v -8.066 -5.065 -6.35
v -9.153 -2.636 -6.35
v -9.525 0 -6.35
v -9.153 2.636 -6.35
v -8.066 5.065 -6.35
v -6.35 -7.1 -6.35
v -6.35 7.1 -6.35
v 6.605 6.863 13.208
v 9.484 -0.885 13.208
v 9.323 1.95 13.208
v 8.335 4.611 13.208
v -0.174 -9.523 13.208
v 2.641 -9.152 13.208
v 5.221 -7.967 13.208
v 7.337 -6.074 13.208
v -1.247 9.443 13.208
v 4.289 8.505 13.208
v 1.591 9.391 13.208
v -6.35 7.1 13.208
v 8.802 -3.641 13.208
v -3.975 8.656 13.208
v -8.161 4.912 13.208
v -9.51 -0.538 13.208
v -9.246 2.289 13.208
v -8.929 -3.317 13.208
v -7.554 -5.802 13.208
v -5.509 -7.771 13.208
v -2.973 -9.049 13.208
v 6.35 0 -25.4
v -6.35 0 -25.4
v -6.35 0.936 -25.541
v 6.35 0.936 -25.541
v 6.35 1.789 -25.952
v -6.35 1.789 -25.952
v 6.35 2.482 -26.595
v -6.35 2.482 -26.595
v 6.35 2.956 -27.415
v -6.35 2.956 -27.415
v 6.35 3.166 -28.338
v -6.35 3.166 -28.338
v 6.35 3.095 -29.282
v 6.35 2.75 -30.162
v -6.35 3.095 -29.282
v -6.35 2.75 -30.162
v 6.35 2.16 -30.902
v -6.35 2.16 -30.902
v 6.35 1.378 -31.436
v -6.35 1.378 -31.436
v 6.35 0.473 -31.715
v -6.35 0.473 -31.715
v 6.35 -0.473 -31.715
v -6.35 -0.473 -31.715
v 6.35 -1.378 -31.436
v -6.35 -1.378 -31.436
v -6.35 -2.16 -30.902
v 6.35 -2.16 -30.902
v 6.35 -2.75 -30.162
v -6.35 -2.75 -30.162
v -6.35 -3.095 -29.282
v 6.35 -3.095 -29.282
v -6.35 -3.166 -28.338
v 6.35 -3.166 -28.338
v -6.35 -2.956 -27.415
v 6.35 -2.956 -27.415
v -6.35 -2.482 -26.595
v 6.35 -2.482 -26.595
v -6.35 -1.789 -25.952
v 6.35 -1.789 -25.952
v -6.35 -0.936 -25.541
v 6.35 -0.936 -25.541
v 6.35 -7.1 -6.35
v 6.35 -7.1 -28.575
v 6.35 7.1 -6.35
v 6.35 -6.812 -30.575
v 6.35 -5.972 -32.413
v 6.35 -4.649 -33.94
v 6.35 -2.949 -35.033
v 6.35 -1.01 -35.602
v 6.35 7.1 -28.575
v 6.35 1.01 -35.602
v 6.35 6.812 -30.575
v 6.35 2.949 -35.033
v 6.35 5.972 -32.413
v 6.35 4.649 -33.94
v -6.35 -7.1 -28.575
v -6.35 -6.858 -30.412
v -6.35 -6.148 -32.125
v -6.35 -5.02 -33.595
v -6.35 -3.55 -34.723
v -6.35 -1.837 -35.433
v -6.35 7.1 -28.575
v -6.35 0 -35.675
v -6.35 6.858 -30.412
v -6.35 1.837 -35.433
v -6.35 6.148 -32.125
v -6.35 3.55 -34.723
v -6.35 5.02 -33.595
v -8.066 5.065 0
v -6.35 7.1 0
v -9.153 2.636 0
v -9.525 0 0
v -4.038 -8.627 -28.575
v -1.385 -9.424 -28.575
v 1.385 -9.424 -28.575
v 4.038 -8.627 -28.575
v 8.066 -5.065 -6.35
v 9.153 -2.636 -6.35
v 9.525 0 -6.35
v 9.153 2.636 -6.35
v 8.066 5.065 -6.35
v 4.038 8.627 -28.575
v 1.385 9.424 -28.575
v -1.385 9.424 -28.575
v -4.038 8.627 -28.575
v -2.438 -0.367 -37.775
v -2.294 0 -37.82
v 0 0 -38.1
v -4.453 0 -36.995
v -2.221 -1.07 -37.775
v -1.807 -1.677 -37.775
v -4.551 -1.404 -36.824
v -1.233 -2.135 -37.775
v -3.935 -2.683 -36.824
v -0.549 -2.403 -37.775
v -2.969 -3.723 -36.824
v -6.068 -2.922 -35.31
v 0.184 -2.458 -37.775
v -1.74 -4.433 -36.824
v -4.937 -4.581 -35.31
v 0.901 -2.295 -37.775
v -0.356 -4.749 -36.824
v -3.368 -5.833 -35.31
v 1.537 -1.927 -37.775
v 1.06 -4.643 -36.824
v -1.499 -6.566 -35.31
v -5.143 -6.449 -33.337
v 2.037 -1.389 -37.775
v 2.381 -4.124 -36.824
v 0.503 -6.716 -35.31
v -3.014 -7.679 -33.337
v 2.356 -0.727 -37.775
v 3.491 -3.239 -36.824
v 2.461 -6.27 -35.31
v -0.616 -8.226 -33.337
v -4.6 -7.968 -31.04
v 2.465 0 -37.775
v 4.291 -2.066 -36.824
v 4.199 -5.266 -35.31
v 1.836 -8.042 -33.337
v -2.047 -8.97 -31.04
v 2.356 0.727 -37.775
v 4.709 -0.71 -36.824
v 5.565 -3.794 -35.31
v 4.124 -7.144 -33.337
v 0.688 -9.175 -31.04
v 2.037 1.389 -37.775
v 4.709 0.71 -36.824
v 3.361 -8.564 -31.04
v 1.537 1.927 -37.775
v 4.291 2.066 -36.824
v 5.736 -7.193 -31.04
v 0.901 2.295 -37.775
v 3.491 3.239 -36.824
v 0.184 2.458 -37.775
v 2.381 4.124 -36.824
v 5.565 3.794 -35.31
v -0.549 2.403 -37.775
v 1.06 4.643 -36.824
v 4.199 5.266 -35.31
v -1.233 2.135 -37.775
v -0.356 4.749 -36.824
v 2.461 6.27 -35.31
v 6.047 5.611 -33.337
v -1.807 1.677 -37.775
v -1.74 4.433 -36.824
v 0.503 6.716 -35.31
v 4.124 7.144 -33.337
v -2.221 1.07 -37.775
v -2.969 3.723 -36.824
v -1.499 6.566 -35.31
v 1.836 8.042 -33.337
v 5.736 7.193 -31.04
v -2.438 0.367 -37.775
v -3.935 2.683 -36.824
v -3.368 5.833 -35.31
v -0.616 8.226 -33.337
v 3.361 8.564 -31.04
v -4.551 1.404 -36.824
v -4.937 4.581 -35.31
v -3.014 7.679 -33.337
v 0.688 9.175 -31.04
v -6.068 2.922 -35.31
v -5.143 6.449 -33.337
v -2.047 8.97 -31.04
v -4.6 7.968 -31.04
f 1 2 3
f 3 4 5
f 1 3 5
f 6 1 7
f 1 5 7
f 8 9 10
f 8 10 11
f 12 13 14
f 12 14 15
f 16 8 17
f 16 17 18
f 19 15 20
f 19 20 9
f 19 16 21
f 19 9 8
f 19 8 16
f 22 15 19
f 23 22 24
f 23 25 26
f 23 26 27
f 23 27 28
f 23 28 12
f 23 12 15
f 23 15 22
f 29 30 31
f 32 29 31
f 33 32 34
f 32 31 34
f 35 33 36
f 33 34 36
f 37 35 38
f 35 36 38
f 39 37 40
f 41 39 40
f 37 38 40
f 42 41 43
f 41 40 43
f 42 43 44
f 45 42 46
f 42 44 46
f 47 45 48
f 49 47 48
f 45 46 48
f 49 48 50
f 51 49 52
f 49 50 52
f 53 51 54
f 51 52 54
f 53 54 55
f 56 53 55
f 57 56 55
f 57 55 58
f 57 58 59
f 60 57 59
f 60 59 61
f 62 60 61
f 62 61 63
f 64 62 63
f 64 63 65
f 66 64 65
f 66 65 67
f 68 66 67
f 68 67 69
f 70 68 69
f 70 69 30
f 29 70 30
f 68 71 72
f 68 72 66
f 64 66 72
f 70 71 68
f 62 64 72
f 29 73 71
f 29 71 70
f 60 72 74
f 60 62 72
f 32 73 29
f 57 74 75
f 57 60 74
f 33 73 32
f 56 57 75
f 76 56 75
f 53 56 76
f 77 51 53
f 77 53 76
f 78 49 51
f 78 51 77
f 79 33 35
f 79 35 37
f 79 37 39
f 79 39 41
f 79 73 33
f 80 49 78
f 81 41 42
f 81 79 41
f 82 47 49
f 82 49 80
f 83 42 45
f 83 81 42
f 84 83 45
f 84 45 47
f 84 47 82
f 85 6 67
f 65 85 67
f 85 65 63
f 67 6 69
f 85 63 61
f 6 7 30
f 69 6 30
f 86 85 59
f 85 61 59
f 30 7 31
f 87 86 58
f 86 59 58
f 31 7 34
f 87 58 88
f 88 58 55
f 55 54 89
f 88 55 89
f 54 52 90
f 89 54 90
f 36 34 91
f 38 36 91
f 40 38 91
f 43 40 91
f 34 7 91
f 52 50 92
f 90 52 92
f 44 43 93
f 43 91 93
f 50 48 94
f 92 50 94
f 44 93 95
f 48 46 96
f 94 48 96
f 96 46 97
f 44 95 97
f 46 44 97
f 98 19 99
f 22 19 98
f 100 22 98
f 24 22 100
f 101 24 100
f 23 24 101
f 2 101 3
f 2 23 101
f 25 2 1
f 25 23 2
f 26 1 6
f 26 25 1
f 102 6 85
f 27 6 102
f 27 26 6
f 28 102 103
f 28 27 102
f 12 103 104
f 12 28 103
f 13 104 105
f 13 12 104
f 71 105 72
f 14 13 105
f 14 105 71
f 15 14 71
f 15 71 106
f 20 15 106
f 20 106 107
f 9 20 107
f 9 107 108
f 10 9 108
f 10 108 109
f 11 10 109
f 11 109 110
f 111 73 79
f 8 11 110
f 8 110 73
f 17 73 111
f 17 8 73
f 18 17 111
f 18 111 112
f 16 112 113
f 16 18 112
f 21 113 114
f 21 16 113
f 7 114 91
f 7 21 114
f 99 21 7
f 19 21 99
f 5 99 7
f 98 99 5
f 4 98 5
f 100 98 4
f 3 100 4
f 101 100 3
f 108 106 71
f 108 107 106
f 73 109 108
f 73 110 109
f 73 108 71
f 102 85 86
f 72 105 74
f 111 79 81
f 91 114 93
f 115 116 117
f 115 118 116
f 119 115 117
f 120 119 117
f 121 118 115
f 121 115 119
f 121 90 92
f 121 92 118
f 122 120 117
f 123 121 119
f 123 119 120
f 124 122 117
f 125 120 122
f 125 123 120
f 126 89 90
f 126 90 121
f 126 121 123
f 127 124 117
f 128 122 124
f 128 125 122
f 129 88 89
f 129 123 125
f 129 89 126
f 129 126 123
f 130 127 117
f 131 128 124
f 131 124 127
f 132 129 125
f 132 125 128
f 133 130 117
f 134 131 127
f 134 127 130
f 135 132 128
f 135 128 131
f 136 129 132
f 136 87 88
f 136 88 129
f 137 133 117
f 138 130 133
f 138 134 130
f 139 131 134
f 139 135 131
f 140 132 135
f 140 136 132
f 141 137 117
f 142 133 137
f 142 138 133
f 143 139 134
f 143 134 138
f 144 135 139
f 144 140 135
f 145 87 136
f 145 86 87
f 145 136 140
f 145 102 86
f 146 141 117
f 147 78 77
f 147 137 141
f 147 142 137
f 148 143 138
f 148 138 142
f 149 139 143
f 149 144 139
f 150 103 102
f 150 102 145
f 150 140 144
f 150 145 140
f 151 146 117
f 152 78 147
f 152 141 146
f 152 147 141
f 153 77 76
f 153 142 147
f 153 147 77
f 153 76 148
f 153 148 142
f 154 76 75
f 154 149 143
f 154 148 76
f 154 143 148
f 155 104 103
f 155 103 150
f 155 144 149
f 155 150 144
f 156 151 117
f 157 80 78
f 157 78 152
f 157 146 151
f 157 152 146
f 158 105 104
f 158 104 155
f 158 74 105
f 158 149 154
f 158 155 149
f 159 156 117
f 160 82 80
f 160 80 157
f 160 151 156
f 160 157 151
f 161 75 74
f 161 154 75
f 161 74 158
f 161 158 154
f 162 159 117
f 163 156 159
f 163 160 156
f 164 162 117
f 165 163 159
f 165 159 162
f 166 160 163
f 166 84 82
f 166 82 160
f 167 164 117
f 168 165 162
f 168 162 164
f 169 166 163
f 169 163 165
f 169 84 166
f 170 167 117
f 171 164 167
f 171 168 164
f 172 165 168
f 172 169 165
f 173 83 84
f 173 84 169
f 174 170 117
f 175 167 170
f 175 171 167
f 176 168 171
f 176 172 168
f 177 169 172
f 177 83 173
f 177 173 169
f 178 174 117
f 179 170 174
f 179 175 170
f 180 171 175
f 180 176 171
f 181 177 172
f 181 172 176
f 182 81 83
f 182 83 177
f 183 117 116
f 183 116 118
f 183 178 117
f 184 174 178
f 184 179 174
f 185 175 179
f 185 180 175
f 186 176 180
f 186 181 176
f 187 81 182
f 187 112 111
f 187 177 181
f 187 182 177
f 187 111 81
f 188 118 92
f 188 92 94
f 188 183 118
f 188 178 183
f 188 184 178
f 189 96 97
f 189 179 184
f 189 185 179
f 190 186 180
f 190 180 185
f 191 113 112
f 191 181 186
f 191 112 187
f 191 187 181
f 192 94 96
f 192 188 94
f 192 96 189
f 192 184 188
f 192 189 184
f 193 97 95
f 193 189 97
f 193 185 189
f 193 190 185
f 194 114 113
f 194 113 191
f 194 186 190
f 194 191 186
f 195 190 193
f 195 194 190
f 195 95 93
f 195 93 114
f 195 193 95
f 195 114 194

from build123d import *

# Parameters (mm, degrees)
SKETCH2_W           = 12.7
SKETCH2_H           = 60.004179461
CUT_EXTRUDE1_DEPTH  = 41.411152545
SKETCH3_R           = 3.175
CUT_EXTRUDE2_DEPTH  = 43.359783404
BOSS_EXTRUDE2_START = 13.208
SKETCH11_R          = 9.525
BOSS_EXTRUDE2_DEPTH = 13.208


with BuildPart() as part:
    # Sketch1 → Revolve1 (revolve)
    with BuildSketch(Plane(origin=(0, 0, 0), x_dir=(1, 0, 0), z_dir=(0, 1, 0)), mode=Mode.PRIVATE) as revolve1_sk:
        with BuildLine():
            Line((0, 0), (0, 28.575))
            Line((0, 28.575), (0, 38.1))
            ThreePointArc((0, 38.1), (6.735192091, 35.310192091), (9.525, 28.575))
            Line((9.525, 28.575), (9.525, 0))
            Line((9.525, 0), (0, 0))
        make_face()
    revolve(revolve1_sk.sketch.rotate(Axis((0, 0, -38.1), (0, 0, 1)), 180), axis=Axis((0, 0, -38.1), (0, 0, 1)))

    # Sketch2 → Cut-Extrude1 (cut, symmetric)
    with BuildSketch(Plane(origin=(0, 0, 0), x_dir=(1, 0, 0), z_dir=(0, 1, 0))):
        with Locations((-12.7, 36.35208973)):
            Rectangle(SKETCH2_W, SKETCH2_H)
    cut_extrude1 = extrude(amount=CUT_EXTRUDE1_DEPTH, both=True, mode=Mode.SUBTRACT)

    # Mirror1: Cut-Extrude1 across plane
    add(cut_extrude1.mirror(Plane(origin=(0, 0, 0), x_dir=(0, 0, 1), z_dir=(1, 0, 0))), mode=Mode.SUBTRACT)

    # Sketch3 → Cut-Extrude2 (cut, through all)
    with BuildSketch(Plane.ZY.offset(6.35)):
        with Locations((-28.575, 0)):
            Circle(SKETCH3_R)
    extrude(amount=-CUT_EXTRUDE2_DEPTH, mode=Mode.SUBTRACT)

    # Sketch11 → Boss-Extrude2 (add)
    with BuildSketch(Plane.XY.offset(BOSS_EXTRUDE2_START)):
        with Locations(Location((0, 0, 0), (0, 0, 131.810314896))):
            Circle(SKETCH11_R)
    extrude(amount=-BOSS_EXTRUDE2_DEPTH)


solid = part.part
